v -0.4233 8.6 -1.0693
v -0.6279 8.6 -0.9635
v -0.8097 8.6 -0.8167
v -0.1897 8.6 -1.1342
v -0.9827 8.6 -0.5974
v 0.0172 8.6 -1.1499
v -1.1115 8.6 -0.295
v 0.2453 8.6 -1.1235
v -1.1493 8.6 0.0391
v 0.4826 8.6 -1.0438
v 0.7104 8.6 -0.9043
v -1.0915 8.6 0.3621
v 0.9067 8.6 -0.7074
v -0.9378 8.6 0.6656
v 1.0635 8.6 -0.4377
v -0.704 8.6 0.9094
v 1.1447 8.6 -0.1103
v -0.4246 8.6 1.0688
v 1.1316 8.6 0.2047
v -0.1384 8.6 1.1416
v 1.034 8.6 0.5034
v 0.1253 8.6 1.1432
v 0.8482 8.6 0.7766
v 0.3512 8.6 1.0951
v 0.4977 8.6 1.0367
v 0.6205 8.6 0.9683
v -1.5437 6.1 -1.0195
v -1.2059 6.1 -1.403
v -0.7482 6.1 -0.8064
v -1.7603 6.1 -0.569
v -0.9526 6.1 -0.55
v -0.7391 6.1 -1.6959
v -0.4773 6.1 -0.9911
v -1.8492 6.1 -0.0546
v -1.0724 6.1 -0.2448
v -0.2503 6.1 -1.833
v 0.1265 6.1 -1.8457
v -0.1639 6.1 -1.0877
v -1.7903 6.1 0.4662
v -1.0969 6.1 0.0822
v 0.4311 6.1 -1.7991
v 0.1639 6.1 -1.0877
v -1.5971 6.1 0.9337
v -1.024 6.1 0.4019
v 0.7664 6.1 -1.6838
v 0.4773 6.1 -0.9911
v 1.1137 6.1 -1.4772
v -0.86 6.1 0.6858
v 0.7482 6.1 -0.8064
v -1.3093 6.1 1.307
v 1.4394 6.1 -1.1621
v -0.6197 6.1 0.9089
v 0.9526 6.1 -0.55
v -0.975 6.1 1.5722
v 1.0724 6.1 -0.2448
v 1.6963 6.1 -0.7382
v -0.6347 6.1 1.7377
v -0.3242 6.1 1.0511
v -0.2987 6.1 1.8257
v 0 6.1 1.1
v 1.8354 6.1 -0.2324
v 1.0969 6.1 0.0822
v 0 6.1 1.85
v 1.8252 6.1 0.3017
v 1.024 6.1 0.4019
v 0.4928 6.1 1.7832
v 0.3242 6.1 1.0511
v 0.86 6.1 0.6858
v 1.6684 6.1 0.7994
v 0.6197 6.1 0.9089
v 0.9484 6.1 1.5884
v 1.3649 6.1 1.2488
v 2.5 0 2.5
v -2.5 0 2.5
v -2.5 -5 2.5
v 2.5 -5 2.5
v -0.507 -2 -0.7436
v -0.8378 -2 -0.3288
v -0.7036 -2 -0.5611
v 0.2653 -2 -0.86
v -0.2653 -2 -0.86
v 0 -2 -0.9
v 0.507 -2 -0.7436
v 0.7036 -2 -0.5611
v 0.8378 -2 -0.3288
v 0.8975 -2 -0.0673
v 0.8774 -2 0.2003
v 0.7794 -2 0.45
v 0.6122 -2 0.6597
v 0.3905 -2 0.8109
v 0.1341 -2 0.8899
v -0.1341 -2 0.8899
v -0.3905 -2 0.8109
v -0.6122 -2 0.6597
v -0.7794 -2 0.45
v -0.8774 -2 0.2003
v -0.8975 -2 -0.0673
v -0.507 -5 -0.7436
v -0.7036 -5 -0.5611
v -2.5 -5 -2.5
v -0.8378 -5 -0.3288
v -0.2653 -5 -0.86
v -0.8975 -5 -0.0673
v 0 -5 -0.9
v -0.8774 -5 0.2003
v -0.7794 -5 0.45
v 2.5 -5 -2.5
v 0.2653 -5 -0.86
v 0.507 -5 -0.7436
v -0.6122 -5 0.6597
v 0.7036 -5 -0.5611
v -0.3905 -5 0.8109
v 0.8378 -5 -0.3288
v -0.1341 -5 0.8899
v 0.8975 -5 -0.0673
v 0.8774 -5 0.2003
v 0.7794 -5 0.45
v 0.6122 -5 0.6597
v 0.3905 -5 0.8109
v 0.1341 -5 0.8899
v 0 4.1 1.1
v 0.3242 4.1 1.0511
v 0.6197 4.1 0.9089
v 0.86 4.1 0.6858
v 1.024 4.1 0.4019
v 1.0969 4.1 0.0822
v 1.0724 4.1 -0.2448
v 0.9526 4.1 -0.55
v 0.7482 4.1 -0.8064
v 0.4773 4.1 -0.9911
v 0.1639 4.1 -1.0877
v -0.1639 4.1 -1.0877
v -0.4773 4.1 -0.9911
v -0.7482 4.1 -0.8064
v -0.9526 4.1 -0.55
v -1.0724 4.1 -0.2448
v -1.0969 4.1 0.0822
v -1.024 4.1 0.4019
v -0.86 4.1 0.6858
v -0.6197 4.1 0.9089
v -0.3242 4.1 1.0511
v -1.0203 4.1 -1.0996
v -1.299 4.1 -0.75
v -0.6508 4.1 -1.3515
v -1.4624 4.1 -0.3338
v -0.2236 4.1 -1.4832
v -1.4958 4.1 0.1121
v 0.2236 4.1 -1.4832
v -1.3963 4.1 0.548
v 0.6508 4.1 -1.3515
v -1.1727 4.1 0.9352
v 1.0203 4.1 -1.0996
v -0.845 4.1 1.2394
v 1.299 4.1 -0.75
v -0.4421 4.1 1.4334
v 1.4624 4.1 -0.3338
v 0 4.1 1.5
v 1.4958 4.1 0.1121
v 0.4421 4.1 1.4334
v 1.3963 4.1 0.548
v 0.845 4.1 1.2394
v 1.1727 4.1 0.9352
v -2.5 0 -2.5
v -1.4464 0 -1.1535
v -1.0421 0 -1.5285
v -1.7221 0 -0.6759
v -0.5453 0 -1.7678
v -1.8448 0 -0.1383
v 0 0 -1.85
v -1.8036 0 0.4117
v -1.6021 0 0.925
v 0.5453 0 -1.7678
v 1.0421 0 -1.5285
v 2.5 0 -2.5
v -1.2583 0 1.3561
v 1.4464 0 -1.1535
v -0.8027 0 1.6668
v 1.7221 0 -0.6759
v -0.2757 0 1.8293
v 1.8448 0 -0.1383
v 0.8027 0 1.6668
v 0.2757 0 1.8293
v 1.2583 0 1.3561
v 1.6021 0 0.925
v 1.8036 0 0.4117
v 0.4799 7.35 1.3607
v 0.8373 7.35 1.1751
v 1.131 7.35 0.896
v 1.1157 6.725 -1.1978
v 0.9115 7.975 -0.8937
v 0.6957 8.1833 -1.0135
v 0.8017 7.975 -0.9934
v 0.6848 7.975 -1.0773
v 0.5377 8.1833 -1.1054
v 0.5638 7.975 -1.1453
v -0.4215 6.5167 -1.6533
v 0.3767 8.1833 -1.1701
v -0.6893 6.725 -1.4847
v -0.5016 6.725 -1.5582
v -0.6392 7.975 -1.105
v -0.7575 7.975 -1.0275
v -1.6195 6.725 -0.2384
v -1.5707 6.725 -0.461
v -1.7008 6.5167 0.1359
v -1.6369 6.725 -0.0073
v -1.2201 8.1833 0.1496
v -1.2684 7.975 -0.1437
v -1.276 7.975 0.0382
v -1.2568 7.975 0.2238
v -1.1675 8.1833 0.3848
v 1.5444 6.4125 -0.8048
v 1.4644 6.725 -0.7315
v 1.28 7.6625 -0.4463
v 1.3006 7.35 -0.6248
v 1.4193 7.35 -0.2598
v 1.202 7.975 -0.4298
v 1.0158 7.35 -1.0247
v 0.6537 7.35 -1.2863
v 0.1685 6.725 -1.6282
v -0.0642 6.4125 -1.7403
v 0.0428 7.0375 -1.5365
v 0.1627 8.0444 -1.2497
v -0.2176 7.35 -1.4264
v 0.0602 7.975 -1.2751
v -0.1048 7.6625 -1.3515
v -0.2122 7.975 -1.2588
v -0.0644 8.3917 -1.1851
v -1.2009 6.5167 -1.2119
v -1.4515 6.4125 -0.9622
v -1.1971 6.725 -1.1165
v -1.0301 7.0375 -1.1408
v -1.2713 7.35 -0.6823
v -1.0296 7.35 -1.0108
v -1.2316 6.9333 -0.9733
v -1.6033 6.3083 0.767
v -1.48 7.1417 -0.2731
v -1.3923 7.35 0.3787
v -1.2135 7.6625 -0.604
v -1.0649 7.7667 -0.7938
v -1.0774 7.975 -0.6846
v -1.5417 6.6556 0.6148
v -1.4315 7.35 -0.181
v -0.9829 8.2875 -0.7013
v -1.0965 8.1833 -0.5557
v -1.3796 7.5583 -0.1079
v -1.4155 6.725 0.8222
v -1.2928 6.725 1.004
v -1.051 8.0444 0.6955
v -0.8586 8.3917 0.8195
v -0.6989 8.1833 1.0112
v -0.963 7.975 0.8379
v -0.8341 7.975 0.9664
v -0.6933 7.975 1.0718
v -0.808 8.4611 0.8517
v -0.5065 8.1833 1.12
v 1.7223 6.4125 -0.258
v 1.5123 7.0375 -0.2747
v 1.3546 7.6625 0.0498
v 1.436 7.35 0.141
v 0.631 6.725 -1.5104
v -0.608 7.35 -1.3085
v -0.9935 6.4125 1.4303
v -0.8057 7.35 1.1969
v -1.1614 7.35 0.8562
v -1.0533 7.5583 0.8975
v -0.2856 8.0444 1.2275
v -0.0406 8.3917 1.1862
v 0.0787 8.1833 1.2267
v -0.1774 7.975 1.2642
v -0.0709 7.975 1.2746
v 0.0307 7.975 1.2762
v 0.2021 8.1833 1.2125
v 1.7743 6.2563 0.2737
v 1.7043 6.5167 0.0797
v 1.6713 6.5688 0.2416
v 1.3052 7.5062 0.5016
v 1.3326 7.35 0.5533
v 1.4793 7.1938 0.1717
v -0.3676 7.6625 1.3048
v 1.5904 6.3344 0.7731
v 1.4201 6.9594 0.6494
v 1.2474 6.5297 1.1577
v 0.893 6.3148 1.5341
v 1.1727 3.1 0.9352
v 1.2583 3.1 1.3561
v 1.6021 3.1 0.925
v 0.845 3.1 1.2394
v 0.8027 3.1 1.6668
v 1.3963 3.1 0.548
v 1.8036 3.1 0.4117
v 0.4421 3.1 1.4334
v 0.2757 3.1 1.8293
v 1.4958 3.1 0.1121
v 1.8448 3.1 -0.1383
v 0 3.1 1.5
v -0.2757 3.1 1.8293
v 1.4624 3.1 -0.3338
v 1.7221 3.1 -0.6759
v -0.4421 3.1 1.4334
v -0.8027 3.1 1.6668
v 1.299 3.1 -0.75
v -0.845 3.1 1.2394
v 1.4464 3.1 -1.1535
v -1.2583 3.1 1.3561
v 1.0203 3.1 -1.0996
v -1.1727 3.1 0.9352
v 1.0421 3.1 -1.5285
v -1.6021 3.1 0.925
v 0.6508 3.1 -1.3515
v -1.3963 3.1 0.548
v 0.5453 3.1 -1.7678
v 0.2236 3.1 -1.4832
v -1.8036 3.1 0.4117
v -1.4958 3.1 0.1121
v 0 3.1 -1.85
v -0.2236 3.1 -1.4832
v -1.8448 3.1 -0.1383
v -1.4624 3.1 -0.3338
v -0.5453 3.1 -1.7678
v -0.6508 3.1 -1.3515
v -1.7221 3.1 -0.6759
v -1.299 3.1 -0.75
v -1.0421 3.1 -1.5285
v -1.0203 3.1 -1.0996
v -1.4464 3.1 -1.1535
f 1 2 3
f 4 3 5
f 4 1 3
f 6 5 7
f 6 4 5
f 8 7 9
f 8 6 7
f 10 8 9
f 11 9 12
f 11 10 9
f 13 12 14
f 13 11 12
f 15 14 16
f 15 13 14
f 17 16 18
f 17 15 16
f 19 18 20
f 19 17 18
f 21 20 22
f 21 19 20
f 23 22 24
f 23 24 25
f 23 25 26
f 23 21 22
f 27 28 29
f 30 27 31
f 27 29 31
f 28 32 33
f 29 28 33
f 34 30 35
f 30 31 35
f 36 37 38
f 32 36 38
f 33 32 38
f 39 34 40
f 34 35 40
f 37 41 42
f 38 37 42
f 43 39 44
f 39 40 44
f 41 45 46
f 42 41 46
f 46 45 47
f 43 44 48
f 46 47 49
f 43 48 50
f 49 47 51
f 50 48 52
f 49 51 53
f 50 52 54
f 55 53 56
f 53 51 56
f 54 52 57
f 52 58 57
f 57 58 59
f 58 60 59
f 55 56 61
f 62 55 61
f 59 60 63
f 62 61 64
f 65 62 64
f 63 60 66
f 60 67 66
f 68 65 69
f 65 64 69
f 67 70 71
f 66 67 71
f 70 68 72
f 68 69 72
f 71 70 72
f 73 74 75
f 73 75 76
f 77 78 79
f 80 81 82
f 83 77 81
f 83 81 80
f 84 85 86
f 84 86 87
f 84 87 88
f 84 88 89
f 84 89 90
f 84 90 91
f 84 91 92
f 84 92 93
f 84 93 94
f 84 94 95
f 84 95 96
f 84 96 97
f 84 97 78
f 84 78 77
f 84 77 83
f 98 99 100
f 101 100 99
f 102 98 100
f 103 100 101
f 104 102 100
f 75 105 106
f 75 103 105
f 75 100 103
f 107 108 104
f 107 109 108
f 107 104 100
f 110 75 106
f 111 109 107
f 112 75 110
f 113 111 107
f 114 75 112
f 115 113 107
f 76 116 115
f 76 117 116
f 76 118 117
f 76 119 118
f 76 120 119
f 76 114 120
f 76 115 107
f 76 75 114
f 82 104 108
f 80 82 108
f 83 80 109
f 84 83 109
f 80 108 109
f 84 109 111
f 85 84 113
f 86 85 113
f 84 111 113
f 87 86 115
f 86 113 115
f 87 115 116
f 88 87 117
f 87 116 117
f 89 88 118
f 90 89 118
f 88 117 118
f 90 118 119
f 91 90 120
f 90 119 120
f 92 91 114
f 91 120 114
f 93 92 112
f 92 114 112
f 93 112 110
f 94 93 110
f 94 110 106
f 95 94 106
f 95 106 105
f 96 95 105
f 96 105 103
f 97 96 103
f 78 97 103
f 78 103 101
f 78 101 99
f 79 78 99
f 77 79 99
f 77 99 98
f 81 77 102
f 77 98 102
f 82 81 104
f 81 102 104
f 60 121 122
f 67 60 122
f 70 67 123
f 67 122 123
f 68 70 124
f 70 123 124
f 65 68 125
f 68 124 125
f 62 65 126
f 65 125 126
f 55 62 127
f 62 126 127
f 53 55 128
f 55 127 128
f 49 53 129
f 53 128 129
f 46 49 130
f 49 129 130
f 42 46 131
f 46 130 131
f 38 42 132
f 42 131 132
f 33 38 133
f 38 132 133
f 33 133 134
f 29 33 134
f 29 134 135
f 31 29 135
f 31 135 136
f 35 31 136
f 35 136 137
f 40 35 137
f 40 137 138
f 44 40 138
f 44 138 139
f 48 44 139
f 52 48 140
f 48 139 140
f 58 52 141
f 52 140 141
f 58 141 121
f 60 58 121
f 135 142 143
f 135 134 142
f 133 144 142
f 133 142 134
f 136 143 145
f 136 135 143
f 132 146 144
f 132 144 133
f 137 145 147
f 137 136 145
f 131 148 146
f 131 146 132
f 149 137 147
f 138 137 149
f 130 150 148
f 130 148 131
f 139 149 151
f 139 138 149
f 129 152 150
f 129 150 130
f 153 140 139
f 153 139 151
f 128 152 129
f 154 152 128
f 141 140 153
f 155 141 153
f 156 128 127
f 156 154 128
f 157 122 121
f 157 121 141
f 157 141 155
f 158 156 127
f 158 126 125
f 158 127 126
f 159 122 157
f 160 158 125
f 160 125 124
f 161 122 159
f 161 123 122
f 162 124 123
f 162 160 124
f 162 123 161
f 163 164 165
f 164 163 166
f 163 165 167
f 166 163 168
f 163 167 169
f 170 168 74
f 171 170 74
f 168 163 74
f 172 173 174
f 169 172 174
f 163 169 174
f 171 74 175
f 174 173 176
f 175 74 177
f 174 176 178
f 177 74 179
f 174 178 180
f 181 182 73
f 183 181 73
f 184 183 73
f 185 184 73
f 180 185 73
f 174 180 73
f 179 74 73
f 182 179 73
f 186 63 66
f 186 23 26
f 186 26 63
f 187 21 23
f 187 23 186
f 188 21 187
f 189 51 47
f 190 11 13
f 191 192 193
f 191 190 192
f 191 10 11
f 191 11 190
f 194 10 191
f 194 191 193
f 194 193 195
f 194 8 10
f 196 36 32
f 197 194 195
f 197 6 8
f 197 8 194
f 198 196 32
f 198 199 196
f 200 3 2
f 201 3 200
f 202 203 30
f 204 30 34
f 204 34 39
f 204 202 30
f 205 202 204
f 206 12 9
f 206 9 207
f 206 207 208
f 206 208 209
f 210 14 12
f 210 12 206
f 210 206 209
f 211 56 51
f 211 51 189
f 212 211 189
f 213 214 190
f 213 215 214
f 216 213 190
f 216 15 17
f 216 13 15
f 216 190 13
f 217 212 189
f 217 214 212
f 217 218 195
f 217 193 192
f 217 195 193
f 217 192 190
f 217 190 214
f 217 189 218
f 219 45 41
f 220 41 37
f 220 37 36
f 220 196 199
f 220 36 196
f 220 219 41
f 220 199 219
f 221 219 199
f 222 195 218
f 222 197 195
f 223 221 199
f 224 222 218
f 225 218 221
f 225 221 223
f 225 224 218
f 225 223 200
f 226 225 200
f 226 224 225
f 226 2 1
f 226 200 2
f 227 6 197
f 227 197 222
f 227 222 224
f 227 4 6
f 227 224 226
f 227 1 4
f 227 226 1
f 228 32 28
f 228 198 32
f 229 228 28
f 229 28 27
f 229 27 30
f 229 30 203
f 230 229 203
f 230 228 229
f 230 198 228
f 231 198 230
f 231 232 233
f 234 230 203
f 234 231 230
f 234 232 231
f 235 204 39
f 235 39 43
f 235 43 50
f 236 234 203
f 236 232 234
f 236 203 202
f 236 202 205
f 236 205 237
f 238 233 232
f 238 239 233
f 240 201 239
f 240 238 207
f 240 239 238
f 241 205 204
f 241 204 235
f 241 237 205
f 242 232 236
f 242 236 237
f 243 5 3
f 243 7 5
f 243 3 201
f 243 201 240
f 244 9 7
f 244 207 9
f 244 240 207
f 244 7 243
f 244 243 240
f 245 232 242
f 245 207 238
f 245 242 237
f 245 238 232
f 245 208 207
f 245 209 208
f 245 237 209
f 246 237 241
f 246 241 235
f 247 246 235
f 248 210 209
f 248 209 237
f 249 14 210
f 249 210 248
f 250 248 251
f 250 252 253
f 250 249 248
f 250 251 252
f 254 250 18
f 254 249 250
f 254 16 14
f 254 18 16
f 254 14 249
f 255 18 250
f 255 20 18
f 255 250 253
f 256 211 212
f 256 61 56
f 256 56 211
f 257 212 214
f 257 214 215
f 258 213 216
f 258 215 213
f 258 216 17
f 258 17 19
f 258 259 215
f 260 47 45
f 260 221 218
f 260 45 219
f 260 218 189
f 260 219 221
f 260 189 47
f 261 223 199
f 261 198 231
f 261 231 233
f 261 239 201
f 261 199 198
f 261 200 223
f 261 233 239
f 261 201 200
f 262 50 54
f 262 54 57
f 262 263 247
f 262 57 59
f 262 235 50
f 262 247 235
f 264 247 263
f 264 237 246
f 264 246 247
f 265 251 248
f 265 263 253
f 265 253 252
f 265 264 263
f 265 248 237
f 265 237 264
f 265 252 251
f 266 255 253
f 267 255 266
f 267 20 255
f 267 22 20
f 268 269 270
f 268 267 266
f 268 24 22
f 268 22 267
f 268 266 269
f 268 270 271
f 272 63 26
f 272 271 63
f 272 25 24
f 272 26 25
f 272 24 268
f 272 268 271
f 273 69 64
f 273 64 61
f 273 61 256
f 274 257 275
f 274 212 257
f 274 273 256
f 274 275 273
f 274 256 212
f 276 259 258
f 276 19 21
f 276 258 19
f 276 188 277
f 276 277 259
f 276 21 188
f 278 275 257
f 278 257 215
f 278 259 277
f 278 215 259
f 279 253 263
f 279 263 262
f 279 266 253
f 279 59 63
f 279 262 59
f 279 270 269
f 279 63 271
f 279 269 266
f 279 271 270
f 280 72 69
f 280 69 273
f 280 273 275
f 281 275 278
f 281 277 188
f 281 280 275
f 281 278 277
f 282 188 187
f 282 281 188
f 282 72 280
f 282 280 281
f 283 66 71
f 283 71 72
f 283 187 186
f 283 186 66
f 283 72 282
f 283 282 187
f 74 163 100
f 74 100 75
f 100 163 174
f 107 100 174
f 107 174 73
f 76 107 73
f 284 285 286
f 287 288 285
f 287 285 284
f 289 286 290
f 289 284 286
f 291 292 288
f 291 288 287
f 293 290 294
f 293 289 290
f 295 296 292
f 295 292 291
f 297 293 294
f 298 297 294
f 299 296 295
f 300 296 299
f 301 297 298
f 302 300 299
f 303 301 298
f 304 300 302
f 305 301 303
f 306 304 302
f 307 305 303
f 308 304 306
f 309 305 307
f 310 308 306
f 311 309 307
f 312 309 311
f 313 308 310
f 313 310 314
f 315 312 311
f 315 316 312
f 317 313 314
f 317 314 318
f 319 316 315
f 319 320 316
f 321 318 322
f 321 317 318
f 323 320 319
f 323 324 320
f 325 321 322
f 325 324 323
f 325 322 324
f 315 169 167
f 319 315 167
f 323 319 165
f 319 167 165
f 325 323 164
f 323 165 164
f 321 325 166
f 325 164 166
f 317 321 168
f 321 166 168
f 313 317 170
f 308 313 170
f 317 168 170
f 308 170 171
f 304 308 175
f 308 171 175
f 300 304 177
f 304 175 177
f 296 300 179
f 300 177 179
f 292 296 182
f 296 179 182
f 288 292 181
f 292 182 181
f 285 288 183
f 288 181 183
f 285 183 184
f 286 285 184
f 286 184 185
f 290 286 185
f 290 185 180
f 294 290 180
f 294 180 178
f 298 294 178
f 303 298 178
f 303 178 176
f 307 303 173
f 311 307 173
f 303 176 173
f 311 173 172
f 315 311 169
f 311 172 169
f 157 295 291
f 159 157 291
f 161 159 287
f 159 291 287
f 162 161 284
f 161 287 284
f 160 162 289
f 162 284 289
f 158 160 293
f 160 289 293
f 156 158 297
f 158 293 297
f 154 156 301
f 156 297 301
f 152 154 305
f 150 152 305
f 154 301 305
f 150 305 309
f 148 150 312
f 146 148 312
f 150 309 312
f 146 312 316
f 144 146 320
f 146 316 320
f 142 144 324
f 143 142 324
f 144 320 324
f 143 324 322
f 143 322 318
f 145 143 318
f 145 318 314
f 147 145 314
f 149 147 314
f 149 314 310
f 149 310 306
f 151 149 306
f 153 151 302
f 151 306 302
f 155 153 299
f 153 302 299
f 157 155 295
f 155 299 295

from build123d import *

# Parameters (mm, degrees)
SKETCH1_R           = 1.85
BOSS_EXTRUDE1_DEPTH = 3.1
SKETCH2_R           = 1.5
BOSS_EXTRUDE2_DEPTH = 1
SKETCH3_R           = 1.1
BOSS_EXTRUDE3_DEPTH = 2
SKETCH6_W           = 5
SKETCH6_H           = 5
BOSS_EXTRUDE4_DEPTH = 5
SKETCH7_R           = 0.9
CUT_EXTRUDE1_DEPTH  = 3


with BuildPart() as part:
    # Sketch1 → Boss-Extrude1 (new body)
    with BuildSketch(Plane(origin=(0, 0, 0), x_dir=(1, 0, 0), z_dir=(0, 1, 0))):
        with Locations(Location((0, 0, 0), (0, 0, 90))):
            Circle(SKETCH1_R)
    extrude(amount=BOSS_EXTRUDE1_DEPTH)

    # Sketch2 → Boss-Extrude2 (add)
    with BuildSketch(Plane(origin=(0, 3.1, 0), x_dir=(1, 0, 0), z_dir=(0, 1, 0))):
        with Locations(Location((0, 0, 0), (0, 0, 270))):
            Circle(SKETCH2_R)
    extrude(amount=BOSS_EXTRUDE2_DEPTH)

    # Sketch3 → Boss-Extrude3 (add)
    with BuildSketch(Plane(origin=(0, 4.1, 0), x_dir=(1, 0, 0), z_dir=(0, 1, 0))):
        with Locations(Location((0, 0, 0), (0, 0, 270))):
            Circle(SKETCH3_R)
    extrude(amount=BOSS_EXTRUDE3_DEPTH)

    # Loft1: read off the stored shape, not the designer's step
    # Loft1: loft between two sections, ruled curve by curve
    loft1_from = [
        Edge.make_bspline([(0, 6.1, 1.85), (3.7, 6.1, 1.85), (3.7, 6.1, -1.85), (0, 6.1, -1.85), (-3.7, 6.1, -1.85), (-3.7, 6.1, 1.85), (0, 6.1, 1.85)], [0, 0, 0, 0, 0.5, 0.5, 0.5, 1, 1, 1, 1], 3, [1, 0.333333333, 0.333333333, 1, 0.333333333, 0.333333333, 1]),
    ]
    loft1_to = [
        Edge.make_bspline([(0.620465421, 8.6, 0.968257539), (2.556980499, 8.6, -0.272673303), (1.316049657, 8.6, -2.209188381), (-0.620465421, 8.6, -0.968257539), (-2.556980499, 8.6, 0.272673303), (-1.316049657, 8.6, 2.209188381), (0.620465421, 8.6, 0.968257539)], [0, 0, 0, 0, 0.5, 0.5, 0.5, 1, 1, 1, 1], 3, [1, 0.333333333, 0.333333333, 1, 0.333333333, 0.333333333, 1]),
    ]
    loft1 = Solid(Shell([*[Face.make_surface_from_curves(loft1_from[k], loft1_to[k]) for k in range(1)], Face(Wire(loft1_from)), Face(Wire(loft1_to))]))
    add(loft1)

    # Sketch6 → Boss-Extrude4 (add)
    with BuildSketch(Plane.XZ):
        Rectangle(SKETCH6_W, SKETCH6_H)
    extrude(amount=BOSS_EXTRUDE4_DEPTH)

    # Sketch7 → Cut-Extrude1 (cut)
    with BuildSketch(Plane.XZ.offset(5)):
        with Locations(Location((0, 0, 0), (0, 0, 270))):
            Circle(SKETCH7_R)
    extrude(amount=-CUT_EXTRUDE1_DEPTH, mode=Mode.SUBTRACT)


solid = part.part
